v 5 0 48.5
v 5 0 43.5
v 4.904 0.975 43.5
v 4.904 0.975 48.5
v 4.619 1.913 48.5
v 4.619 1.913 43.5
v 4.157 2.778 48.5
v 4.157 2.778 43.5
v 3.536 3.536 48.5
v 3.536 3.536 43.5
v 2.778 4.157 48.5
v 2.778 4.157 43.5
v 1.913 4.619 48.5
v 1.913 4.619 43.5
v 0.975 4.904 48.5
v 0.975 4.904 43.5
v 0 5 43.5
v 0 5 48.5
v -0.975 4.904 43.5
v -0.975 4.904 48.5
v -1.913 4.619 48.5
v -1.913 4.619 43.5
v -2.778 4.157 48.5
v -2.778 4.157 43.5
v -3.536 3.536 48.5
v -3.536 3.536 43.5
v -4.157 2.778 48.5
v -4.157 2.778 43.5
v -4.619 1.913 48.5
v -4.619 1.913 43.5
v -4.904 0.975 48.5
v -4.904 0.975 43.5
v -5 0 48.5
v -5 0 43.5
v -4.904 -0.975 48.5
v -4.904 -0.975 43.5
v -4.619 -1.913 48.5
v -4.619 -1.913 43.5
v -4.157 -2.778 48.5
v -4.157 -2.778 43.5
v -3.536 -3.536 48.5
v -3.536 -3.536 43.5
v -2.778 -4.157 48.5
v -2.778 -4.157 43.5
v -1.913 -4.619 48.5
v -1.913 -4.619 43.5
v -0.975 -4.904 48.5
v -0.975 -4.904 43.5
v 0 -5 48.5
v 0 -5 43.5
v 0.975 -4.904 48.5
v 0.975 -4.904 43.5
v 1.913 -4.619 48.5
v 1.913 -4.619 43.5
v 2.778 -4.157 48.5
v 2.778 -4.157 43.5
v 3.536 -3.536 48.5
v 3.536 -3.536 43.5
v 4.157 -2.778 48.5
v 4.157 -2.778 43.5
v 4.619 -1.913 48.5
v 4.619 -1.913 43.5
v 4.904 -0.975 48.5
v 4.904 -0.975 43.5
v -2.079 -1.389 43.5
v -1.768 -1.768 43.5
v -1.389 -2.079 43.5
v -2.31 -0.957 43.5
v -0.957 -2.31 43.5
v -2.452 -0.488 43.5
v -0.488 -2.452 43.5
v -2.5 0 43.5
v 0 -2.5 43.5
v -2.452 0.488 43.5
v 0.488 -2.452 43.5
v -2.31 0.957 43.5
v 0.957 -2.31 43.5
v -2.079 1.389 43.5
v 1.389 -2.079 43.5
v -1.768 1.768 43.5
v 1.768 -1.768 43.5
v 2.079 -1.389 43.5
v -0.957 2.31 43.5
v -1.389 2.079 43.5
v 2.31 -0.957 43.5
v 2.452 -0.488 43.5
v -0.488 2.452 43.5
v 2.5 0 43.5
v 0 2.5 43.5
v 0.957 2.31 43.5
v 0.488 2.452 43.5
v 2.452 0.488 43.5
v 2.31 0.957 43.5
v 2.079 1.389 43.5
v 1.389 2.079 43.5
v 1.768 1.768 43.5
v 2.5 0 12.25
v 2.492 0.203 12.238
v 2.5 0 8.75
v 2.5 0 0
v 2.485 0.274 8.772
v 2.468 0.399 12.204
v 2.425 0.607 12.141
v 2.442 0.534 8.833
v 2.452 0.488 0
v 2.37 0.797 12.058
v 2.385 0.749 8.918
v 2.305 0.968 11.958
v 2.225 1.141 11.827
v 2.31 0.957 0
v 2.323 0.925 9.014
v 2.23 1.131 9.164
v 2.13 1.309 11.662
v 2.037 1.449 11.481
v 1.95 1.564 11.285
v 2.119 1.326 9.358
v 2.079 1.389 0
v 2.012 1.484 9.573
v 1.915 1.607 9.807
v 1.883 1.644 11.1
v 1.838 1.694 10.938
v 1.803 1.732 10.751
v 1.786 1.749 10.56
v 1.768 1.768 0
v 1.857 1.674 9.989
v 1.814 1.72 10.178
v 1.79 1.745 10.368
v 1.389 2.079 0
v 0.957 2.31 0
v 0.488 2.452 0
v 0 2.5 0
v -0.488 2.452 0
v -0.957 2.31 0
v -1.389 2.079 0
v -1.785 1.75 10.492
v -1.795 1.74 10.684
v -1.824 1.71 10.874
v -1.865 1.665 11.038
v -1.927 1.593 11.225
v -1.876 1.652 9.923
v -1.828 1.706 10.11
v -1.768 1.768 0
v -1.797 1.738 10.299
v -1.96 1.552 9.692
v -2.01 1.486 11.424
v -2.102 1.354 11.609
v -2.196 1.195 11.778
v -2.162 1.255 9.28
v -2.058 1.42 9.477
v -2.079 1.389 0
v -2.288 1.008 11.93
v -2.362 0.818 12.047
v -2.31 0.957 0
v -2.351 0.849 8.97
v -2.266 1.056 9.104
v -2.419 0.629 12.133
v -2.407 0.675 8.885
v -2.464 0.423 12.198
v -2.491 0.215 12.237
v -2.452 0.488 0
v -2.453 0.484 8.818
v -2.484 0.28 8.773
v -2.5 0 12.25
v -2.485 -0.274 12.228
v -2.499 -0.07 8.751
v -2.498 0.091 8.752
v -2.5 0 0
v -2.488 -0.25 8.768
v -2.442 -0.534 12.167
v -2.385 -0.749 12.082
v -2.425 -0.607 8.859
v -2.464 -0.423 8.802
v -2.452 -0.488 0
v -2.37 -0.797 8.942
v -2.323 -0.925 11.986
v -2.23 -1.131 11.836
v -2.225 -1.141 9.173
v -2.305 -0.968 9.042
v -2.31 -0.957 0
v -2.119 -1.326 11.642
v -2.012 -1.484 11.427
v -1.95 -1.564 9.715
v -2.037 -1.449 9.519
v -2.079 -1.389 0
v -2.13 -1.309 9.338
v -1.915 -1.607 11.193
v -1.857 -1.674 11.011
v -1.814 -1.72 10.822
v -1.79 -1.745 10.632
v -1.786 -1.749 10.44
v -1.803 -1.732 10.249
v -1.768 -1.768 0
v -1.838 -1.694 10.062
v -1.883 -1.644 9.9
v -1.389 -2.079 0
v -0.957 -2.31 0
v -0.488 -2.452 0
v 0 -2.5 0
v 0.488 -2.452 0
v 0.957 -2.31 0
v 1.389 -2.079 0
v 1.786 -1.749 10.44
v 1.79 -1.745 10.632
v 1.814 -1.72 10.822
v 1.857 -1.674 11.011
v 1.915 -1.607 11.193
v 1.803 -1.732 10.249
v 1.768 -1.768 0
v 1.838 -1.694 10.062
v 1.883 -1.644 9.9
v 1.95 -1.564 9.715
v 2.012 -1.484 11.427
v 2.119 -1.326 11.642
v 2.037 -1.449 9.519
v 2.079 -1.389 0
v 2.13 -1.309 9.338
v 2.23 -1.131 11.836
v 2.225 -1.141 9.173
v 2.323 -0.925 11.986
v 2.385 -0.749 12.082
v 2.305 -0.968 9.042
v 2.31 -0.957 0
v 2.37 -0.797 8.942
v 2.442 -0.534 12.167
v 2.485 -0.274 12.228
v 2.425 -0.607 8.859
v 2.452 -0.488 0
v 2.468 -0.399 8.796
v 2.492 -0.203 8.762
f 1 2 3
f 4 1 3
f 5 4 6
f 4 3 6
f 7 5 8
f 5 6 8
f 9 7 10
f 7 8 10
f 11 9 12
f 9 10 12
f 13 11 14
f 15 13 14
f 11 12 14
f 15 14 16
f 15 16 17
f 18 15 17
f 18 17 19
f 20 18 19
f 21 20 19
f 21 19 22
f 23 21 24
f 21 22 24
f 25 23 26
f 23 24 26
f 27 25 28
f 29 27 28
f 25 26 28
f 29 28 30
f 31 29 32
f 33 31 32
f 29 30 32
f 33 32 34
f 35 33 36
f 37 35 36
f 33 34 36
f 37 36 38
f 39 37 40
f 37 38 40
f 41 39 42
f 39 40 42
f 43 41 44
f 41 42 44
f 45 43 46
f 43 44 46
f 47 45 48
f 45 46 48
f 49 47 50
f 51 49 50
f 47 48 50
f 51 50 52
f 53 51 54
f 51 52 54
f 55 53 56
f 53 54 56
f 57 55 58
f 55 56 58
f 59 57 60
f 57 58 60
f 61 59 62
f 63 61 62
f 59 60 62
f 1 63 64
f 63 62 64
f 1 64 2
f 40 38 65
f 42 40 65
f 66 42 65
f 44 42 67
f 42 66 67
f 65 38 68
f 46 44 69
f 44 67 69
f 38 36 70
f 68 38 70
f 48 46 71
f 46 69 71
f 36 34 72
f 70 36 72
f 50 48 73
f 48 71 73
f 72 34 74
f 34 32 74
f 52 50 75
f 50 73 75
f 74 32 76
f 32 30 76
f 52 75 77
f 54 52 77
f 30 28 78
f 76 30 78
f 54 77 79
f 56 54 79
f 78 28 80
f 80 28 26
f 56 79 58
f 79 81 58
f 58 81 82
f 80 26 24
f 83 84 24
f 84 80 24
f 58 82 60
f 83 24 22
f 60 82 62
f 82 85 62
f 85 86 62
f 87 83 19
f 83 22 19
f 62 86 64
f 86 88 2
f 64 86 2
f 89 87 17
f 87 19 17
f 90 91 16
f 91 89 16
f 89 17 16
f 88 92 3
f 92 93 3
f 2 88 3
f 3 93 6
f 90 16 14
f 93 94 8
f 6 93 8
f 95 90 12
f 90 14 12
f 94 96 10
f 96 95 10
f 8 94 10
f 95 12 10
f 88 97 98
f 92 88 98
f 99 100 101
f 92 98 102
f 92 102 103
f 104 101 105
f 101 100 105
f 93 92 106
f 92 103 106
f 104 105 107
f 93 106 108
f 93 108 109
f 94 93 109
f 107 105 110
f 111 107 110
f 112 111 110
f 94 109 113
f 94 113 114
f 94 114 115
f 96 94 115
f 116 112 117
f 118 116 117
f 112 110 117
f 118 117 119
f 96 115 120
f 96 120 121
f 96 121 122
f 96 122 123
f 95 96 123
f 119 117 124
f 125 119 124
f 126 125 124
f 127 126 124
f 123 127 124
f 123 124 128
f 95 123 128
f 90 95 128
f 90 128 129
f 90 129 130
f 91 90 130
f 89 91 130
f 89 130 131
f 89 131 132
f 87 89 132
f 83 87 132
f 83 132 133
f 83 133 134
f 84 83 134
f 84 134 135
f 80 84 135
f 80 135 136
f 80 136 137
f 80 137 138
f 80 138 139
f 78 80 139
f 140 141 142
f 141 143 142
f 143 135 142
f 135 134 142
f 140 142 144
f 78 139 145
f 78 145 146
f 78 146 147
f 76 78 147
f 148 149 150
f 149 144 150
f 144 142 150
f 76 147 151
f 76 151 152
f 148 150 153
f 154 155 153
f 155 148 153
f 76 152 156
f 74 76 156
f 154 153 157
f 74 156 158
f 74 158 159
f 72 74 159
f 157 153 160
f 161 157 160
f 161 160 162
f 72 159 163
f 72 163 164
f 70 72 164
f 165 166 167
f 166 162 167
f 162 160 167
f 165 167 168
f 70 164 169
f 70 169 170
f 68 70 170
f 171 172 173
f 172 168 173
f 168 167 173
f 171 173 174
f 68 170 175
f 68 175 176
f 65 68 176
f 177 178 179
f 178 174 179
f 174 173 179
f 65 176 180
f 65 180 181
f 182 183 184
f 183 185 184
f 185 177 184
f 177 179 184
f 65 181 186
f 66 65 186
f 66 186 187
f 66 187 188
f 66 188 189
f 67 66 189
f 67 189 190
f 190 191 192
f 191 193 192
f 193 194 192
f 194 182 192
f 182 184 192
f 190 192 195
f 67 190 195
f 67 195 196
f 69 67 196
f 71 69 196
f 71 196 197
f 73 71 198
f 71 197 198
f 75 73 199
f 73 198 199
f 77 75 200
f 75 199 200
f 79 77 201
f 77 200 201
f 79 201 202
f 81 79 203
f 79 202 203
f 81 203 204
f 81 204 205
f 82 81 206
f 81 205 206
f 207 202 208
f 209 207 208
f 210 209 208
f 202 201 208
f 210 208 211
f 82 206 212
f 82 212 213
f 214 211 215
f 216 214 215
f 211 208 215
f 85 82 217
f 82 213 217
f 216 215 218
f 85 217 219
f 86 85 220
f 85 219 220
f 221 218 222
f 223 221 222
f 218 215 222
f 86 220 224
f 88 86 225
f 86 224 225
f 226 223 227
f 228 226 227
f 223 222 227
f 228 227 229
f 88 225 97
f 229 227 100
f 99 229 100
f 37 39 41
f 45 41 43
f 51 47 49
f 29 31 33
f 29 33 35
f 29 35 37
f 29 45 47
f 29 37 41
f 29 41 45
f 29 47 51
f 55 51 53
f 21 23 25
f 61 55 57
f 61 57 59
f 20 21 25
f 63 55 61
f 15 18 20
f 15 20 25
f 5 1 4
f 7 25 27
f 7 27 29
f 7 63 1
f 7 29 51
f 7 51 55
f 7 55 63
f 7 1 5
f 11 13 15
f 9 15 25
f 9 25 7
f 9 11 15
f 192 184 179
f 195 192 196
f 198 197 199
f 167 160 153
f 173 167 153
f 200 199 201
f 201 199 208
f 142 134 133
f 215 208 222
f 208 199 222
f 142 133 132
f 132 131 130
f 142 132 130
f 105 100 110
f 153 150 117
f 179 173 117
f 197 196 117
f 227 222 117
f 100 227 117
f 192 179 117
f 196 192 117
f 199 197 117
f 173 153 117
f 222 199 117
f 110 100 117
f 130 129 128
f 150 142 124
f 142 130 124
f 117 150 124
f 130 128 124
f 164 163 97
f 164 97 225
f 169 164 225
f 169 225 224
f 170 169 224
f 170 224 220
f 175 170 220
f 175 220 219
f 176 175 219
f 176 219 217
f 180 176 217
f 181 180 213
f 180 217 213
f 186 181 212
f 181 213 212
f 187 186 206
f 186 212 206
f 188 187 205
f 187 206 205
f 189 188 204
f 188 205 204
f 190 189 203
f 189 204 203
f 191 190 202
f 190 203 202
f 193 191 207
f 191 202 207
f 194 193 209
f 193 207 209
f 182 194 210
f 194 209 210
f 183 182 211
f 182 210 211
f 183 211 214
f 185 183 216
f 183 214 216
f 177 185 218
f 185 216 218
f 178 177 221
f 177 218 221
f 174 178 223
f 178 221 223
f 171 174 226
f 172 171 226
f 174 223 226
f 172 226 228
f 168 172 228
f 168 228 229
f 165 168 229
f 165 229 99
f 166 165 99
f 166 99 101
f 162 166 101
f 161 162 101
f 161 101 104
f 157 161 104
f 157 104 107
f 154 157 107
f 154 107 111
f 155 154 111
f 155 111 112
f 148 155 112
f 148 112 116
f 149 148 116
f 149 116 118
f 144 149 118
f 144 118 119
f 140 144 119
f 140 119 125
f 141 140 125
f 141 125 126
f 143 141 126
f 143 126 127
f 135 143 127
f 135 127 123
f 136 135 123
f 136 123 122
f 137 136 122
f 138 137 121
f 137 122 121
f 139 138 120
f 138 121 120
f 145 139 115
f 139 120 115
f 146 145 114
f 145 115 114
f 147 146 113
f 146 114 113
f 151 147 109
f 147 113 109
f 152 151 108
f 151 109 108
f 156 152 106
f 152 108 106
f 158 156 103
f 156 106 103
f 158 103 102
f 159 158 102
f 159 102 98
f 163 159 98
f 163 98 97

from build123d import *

# Parameters (mm, degrees)
SKETCH1_R           = 2.5
BOSS_EXTRUDE1_DEPTH = 43.5
SKETCH2_R           = 5
BOSS_EXTRUDE2_DEPTH = 5
CUT_EXTRUDE2_START  = 10
SKETCH3_R           = 1.75
CUT_EXTRUDE2_DEPTH  = 20


with BuildPart() as part:
    # Sketch1 → Boss-Extrude1 (new body)
    with BuildSketch(Plane.XY):
        Circle(SKETCH1_R)
    extrude(amount=BOSS_EXTRUDE1_DEPTH)

    # Sketch2 → Boss-Extrude2 (add)
    with BuildSketch(Plane.XY.offset(43.5)):
        Circle(SKETCH2_R)
    extrude(amount=BOSS_EXTRUDE2_DEPTH)

    # Sketch3 → Cut-Extrude2 (cut)
    with BuildSketch(Plane(origin=(0, 0, 0), x_dir=(0, 0, -1), z_dir=(1, 0, 0)).offset(CUT_EXTRUDE2_START)):
        with Locations(Location((-10.5, 0, 0), (0, 0, 180))):
            Circle(SKETCH3_R)
    extrude(amount=-CUT_EXTRUDE2_DEPTH, mode=Mode.SUBTRACT)


solid = part.part
